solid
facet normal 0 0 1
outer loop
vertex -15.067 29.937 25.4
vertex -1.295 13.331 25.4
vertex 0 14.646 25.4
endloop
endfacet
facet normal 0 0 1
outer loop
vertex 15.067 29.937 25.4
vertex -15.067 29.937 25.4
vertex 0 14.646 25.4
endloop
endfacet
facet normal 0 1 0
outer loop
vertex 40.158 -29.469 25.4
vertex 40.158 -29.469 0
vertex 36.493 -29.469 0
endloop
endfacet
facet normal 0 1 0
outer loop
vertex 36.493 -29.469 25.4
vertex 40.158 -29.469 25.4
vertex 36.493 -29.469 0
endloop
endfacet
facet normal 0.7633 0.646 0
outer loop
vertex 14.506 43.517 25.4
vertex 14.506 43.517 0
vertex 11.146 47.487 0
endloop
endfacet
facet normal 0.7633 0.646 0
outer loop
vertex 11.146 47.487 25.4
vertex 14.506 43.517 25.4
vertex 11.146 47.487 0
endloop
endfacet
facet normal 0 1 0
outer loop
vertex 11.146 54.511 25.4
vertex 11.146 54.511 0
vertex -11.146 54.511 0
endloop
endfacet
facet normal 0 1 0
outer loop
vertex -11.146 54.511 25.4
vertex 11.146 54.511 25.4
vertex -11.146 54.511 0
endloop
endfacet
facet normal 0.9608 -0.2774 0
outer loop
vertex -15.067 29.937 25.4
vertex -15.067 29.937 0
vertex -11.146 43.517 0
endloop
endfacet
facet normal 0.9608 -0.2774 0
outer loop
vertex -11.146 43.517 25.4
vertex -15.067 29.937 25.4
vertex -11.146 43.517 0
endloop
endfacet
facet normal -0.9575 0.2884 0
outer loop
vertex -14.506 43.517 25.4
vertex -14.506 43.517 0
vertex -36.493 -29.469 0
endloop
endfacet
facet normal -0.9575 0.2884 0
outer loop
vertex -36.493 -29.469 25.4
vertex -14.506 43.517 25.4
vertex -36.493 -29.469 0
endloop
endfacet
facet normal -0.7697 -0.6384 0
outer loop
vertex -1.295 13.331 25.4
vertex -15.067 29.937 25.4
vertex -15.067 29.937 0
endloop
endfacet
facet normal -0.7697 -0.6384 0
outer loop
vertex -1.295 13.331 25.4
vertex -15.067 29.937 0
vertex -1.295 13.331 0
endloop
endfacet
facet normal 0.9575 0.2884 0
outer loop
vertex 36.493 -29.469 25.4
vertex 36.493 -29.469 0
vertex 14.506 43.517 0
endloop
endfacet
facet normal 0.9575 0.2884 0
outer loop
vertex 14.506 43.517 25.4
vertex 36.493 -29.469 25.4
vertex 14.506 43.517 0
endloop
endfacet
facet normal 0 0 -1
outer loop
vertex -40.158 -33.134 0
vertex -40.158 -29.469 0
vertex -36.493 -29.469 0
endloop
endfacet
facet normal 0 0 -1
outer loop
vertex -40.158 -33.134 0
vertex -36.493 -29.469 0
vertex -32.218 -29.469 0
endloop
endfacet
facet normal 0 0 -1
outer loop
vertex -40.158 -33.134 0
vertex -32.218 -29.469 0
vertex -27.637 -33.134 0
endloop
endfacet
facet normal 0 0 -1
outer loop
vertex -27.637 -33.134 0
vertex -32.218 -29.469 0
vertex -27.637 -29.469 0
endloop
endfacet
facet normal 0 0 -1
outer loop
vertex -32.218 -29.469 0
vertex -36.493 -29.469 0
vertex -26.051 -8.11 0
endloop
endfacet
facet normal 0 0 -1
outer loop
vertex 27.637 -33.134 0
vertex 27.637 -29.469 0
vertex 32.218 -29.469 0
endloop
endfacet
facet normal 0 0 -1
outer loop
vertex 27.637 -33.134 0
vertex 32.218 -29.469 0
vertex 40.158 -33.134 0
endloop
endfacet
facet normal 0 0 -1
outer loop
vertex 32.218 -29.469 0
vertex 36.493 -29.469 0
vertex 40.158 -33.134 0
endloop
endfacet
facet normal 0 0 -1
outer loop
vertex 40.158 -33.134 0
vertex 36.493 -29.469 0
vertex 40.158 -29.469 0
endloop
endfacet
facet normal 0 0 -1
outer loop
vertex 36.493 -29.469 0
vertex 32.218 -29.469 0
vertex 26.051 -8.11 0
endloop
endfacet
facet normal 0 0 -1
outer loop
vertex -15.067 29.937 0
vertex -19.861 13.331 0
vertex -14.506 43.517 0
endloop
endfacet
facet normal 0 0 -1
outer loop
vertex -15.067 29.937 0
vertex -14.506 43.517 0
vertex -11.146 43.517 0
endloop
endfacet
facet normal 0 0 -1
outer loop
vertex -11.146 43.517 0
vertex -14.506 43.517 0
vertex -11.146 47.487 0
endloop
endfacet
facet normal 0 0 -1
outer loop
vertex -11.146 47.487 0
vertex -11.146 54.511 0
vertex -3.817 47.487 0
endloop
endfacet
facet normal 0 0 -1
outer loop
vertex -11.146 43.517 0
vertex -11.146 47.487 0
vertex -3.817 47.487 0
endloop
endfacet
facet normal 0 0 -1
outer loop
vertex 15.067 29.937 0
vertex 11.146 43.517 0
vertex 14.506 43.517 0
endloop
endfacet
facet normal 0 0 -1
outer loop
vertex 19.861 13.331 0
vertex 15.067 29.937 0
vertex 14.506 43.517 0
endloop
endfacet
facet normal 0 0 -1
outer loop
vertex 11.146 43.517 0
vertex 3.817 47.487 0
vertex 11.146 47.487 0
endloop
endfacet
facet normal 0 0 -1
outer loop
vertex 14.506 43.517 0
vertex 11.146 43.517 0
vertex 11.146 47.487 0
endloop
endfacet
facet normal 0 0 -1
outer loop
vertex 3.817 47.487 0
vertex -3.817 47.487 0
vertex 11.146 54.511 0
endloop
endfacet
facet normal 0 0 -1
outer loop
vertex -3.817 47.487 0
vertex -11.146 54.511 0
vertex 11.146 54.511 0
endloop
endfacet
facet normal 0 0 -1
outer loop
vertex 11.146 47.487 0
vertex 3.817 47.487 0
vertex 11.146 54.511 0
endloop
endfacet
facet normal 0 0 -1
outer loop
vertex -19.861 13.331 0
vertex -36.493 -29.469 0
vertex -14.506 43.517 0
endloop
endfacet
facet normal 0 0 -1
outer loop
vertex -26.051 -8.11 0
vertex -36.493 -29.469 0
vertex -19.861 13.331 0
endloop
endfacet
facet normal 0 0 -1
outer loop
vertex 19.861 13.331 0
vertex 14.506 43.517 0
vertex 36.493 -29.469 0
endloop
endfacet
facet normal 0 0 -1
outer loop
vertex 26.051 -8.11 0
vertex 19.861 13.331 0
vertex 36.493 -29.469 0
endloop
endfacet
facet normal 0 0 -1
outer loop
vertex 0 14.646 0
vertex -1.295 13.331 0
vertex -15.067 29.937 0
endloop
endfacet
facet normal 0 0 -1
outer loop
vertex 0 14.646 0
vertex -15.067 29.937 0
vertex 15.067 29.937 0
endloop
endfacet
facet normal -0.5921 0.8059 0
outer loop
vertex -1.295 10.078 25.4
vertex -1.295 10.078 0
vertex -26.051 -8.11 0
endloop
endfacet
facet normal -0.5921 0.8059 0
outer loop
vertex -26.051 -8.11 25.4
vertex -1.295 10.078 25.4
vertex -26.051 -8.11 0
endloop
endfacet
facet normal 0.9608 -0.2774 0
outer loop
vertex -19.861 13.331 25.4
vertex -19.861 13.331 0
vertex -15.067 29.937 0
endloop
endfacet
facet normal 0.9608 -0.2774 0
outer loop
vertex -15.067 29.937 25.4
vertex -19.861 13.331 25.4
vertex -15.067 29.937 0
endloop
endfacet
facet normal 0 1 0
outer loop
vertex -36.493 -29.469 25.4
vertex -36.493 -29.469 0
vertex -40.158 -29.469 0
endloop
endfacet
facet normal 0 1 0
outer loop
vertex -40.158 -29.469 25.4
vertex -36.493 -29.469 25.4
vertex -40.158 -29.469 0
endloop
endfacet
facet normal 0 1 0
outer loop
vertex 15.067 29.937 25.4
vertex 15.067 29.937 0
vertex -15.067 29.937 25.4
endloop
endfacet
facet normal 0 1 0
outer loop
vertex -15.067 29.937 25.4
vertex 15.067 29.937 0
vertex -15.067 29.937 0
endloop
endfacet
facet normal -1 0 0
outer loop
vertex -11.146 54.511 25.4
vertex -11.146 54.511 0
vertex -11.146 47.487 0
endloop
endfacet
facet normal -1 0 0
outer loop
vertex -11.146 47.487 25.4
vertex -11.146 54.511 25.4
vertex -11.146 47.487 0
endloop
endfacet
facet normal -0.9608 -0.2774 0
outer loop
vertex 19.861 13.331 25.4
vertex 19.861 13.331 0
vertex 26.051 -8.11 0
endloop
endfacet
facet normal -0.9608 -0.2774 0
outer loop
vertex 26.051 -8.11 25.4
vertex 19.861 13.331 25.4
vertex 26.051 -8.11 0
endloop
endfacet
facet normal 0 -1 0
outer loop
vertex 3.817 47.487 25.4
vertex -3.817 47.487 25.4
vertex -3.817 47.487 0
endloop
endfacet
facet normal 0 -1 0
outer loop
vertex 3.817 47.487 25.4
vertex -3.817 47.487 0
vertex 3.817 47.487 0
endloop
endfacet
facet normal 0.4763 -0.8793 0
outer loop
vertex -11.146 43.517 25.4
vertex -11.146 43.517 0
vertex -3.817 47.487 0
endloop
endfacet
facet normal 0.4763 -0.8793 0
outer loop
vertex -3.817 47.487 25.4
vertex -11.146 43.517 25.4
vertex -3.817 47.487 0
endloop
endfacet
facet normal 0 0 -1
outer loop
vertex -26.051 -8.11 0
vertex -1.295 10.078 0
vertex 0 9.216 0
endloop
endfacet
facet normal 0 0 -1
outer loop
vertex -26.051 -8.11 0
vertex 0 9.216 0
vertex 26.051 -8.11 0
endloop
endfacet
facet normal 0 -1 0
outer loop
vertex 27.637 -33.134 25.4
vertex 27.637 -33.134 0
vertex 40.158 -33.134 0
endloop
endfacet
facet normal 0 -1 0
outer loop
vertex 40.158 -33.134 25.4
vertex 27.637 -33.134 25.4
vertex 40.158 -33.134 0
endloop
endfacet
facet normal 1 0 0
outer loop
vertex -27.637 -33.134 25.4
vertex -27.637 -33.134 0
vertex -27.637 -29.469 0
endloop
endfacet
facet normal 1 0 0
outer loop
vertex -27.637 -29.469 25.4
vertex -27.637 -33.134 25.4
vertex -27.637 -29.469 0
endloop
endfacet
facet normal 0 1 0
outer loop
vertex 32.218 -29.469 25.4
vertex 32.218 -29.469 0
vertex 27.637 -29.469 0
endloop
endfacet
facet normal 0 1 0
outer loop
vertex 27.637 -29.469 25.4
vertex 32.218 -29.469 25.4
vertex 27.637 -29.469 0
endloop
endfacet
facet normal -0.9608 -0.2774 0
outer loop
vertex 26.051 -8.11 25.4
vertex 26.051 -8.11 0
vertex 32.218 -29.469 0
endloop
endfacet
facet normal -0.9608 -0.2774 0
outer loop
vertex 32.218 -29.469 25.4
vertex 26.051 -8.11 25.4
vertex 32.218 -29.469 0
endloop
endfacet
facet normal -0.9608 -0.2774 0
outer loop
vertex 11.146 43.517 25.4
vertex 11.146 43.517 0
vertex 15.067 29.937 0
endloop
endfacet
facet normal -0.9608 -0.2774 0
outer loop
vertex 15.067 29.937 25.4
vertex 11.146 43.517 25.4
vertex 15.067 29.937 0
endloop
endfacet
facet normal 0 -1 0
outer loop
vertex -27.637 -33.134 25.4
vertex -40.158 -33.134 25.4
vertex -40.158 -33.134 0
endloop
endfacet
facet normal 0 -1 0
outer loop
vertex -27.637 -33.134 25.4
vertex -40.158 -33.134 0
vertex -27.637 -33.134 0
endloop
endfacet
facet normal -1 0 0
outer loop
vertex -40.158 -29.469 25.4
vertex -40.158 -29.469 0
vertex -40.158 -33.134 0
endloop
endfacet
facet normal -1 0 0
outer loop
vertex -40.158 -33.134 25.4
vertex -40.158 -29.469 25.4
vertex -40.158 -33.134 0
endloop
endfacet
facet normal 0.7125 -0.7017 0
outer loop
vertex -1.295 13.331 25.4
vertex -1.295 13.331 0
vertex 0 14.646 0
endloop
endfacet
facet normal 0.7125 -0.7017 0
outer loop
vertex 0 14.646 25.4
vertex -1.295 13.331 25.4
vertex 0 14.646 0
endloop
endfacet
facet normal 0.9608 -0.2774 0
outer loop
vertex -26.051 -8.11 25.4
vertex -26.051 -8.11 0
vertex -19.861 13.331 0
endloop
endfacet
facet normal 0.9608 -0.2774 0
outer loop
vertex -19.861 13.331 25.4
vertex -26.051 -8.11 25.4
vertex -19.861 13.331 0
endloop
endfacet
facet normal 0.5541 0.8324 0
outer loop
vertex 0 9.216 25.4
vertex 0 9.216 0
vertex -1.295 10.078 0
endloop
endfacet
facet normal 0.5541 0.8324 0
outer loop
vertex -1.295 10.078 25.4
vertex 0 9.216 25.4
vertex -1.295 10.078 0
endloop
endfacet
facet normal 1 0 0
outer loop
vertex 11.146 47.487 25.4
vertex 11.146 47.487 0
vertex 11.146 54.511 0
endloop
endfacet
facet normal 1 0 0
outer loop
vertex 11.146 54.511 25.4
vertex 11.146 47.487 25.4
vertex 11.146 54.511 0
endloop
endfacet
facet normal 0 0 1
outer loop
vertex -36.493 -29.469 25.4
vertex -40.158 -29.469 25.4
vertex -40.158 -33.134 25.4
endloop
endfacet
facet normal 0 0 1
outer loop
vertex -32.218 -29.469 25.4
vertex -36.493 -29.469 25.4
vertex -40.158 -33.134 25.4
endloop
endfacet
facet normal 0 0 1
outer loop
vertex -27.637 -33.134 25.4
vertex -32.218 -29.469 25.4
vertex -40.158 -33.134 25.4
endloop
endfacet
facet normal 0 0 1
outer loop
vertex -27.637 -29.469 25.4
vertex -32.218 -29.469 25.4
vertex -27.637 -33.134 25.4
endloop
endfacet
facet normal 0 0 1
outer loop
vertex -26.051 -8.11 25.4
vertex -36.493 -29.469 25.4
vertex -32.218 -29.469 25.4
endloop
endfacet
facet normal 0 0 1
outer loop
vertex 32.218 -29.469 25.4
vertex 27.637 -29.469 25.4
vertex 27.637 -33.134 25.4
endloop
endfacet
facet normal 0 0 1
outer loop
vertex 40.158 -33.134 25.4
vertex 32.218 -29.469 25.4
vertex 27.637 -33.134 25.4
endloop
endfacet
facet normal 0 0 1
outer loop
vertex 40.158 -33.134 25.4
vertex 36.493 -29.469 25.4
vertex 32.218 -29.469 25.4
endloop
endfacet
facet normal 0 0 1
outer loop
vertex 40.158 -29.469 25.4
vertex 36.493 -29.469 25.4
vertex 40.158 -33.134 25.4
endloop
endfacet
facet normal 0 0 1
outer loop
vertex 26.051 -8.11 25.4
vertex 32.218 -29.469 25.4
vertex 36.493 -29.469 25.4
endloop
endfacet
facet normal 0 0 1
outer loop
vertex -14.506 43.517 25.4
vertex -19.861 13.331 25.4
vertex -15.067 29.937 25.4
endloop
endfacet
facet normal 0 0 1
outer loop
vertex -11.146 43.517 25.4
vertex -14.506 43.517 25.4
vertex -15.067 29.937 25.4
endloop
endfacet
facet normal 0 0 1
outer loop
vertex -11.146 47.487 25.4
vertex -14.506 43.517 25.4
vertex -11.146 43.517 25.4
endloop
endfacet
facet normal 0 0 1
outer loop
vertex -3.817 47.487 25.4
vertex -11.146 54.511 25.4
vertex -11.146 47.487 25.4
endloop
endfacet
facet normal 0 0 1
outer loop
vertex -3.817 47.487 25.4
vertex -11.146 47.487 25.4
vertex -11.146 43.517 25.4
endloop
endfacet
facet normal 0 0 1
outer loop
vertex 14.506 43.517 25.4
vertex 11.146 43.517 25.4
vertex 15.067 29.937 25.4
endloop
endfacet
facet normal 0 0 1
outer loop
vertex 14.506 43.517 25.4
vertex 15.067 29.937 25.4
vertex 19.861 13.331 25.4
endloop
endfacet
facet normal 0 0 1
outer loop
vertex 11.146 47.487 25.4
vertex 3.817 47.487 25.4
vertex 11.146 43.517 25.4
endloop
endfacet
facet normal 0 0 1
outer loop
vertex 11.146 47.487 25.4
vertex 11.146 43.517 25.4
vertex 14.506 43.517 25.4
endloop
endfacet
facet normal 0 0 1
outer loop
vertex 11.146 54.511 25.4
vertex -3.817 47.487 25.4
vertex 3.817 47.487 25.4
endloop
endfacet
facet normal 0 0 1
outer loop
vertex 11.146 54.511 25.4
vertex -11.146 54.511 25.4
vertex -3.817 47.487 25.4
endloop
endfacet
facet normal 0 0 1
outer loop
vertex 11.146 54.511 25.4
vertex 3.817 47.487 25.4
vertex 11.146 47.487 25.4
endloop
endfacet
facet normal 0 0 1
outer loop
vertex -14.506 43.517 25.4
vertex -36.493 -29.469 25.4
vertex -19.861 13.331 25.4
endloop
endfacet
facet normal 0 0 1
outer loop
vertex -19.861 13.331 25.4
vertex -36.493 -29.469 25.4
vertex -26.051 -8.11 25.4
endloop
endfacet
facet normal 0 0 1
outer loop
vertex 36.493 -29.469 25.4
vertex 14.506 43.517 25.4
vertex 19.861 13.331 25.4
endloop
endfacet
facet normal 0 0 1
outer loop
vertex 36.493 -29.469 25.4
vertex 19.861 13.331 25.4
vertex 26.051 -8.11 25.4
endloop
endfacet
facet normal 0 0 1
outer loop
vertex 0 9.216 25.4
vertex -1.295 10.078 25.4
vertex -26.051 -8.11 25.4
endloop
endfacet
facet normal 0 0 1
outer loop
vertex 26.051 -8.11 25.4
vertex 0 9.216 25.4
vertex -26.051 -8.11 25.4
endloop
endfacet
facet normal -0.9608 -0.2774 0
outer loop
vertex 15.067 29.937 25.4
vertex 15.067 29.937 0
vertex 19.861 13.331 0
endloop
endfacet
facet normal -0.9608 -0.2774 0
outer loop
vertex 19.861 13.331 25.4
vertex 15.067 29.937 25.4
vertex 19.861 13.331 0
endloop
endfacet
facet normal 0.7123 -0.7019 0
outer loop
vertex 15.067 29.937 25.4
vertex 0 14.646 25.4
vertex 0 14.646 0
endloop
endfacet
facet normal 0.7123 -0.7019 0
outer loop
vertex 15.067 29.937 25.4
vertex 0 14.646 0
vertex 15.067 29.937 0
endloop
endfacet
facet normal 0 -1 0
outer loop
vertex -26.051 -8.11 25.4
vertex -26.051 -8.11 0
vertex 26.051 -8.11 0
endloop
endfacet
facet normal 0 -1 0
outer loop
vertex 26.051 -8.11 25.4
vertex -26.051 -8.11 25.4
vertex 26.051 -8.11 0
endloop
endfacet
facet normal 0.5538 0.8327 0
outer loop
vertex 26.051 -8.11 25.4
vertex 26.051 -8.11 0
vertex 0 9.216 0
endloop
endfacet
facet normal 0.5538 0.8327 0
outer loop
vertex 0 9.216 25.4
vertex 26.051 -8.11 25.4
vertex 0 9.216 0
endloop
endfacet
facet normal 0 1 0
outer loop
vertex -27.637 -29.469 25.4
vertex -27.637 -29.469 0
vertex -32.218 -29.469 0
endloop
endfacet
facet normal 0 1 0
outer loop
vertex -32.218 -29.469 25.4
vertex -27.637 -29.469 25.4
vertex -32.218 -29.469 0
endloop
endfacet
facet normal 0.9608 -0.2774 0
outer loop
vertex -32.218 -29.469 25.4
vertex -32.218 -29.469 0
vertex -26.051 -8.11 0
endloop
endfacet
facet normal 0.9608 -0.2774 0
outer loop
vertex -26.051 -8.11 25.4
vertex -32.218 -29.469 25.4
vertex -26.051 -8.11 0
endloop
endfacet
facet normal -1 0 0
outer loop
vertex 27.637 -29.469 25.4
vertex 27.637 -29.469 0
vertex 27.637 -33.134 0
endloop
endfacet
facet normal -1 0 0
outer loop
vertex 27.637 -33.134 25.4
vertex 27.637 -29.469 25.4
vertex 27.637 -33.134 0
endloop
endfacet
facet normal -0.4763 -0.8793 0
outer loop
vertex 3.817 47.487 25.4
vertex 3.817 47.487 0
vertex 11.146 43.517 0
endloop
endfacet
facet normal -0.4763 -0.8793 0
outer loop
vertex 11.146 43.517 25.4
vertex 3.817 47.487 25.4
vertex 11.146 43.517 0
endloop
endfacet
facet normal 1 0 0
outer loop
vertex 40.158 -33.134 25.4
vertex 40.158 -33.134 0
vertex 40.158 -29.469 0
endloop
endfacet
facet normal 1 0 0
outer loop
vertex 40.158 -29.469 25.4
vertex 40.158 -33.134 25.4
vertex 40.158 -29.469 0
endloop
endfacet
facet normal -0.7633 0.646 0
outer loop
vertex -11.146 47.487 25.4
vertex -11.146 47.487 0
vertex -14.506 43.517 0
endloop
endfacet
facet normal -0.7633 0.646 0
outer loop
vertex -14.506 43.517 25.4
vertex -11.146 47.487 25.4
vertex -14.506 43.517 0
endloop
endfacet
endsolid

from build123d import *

# Parameters (mm, degrees)
F1_DEPTH = 25.4


with BuildPart() as f1:
    # F0 (on Top) → F1 (new body)
    with BuildSketch(Plane.XY):
        Polygon((-11.1464317888, 47.4868528545), (-14.5056303591, 43.5168929398), (-36.4931114018, -29.4693335891), (-40.1576906443, -29.4693335891), (-40.1576906443, -33.1339128315), (-27.6370421052, -33.1339128315), (-27.6370421052, -29.4693335891), (-32.2177670896, -29.4693335891), (-26.0511616172, -8.1096400765), (-19.8610611523, 13.3314346496), (-15.0670449303, 29.9367968142), (-11.1464317888, 43.5168929398), (-3.8172712084, 47.4868528545), (0, 47.4868528545), (0, 54.5106306672), (-7.4818514986, 54.5106306672), (-11.1464317888, 54.5106306672), align=None)
        Polygon((8.3979964256, 54.5106306672), (0, 54.5106306672), (0, 47.4868528545), (3.8172712084, 47.4868528545), (11.1464317888, 43.5168929398), (15.0670449303, 29.9367968142), (19.8610611523, 13.3314346496), (26.0511616172, -8.1096400765), (32.2177670896, -29.4693335891), (27.6370421052, -29.4693335891), (27.6370421052, -33.1339128315), (40.1576906443, -33.1339128315), (40.1576906443, -29.4693335891), (36.4931114018, -29.4693335891), (14.5056303591, 43.5168929398), (11.1464317888, 47.4868528545), (11.1464317888, 54.5106306672), align=None)
    extrude(amount=F1_DEPTH)


with BuildPart() as f1b:
    # F0 (on Top) → F1, piece 2 (new body)
    with BuildSketch(Plane.XY):
        Polygon((15.0670449303, 29.9367968142), (0, 29.9367968142), (0, 14.6457949804), align=None)
        Polygon((0, 14.6457949804), (0, 29.9367968142), (-15.0670449303, 29.9367968142), (-1.295109789, 13.3314346496), align=None)
    extrude(amount=F1_DEPTH)


with BuildPart() as f1c:
    # F0 (on Top) → F1, piece 3 (new body)
    with BuildSketch(Plane.XY):
        Polygon((0, 9.216254625), (0, -8.1096400765), (26.0511616172, -8.1096400765), align=None)
        Polygon((-1.295109789, 10.0775957108), (-26.0511616172, -8.1096400765), (0, -8.1096400765), (0, 9.216254625), align=None)
    extrude(amount=F1_DEPTH)


solid = Compound([f1.part, f1b.part, f1c.part])
